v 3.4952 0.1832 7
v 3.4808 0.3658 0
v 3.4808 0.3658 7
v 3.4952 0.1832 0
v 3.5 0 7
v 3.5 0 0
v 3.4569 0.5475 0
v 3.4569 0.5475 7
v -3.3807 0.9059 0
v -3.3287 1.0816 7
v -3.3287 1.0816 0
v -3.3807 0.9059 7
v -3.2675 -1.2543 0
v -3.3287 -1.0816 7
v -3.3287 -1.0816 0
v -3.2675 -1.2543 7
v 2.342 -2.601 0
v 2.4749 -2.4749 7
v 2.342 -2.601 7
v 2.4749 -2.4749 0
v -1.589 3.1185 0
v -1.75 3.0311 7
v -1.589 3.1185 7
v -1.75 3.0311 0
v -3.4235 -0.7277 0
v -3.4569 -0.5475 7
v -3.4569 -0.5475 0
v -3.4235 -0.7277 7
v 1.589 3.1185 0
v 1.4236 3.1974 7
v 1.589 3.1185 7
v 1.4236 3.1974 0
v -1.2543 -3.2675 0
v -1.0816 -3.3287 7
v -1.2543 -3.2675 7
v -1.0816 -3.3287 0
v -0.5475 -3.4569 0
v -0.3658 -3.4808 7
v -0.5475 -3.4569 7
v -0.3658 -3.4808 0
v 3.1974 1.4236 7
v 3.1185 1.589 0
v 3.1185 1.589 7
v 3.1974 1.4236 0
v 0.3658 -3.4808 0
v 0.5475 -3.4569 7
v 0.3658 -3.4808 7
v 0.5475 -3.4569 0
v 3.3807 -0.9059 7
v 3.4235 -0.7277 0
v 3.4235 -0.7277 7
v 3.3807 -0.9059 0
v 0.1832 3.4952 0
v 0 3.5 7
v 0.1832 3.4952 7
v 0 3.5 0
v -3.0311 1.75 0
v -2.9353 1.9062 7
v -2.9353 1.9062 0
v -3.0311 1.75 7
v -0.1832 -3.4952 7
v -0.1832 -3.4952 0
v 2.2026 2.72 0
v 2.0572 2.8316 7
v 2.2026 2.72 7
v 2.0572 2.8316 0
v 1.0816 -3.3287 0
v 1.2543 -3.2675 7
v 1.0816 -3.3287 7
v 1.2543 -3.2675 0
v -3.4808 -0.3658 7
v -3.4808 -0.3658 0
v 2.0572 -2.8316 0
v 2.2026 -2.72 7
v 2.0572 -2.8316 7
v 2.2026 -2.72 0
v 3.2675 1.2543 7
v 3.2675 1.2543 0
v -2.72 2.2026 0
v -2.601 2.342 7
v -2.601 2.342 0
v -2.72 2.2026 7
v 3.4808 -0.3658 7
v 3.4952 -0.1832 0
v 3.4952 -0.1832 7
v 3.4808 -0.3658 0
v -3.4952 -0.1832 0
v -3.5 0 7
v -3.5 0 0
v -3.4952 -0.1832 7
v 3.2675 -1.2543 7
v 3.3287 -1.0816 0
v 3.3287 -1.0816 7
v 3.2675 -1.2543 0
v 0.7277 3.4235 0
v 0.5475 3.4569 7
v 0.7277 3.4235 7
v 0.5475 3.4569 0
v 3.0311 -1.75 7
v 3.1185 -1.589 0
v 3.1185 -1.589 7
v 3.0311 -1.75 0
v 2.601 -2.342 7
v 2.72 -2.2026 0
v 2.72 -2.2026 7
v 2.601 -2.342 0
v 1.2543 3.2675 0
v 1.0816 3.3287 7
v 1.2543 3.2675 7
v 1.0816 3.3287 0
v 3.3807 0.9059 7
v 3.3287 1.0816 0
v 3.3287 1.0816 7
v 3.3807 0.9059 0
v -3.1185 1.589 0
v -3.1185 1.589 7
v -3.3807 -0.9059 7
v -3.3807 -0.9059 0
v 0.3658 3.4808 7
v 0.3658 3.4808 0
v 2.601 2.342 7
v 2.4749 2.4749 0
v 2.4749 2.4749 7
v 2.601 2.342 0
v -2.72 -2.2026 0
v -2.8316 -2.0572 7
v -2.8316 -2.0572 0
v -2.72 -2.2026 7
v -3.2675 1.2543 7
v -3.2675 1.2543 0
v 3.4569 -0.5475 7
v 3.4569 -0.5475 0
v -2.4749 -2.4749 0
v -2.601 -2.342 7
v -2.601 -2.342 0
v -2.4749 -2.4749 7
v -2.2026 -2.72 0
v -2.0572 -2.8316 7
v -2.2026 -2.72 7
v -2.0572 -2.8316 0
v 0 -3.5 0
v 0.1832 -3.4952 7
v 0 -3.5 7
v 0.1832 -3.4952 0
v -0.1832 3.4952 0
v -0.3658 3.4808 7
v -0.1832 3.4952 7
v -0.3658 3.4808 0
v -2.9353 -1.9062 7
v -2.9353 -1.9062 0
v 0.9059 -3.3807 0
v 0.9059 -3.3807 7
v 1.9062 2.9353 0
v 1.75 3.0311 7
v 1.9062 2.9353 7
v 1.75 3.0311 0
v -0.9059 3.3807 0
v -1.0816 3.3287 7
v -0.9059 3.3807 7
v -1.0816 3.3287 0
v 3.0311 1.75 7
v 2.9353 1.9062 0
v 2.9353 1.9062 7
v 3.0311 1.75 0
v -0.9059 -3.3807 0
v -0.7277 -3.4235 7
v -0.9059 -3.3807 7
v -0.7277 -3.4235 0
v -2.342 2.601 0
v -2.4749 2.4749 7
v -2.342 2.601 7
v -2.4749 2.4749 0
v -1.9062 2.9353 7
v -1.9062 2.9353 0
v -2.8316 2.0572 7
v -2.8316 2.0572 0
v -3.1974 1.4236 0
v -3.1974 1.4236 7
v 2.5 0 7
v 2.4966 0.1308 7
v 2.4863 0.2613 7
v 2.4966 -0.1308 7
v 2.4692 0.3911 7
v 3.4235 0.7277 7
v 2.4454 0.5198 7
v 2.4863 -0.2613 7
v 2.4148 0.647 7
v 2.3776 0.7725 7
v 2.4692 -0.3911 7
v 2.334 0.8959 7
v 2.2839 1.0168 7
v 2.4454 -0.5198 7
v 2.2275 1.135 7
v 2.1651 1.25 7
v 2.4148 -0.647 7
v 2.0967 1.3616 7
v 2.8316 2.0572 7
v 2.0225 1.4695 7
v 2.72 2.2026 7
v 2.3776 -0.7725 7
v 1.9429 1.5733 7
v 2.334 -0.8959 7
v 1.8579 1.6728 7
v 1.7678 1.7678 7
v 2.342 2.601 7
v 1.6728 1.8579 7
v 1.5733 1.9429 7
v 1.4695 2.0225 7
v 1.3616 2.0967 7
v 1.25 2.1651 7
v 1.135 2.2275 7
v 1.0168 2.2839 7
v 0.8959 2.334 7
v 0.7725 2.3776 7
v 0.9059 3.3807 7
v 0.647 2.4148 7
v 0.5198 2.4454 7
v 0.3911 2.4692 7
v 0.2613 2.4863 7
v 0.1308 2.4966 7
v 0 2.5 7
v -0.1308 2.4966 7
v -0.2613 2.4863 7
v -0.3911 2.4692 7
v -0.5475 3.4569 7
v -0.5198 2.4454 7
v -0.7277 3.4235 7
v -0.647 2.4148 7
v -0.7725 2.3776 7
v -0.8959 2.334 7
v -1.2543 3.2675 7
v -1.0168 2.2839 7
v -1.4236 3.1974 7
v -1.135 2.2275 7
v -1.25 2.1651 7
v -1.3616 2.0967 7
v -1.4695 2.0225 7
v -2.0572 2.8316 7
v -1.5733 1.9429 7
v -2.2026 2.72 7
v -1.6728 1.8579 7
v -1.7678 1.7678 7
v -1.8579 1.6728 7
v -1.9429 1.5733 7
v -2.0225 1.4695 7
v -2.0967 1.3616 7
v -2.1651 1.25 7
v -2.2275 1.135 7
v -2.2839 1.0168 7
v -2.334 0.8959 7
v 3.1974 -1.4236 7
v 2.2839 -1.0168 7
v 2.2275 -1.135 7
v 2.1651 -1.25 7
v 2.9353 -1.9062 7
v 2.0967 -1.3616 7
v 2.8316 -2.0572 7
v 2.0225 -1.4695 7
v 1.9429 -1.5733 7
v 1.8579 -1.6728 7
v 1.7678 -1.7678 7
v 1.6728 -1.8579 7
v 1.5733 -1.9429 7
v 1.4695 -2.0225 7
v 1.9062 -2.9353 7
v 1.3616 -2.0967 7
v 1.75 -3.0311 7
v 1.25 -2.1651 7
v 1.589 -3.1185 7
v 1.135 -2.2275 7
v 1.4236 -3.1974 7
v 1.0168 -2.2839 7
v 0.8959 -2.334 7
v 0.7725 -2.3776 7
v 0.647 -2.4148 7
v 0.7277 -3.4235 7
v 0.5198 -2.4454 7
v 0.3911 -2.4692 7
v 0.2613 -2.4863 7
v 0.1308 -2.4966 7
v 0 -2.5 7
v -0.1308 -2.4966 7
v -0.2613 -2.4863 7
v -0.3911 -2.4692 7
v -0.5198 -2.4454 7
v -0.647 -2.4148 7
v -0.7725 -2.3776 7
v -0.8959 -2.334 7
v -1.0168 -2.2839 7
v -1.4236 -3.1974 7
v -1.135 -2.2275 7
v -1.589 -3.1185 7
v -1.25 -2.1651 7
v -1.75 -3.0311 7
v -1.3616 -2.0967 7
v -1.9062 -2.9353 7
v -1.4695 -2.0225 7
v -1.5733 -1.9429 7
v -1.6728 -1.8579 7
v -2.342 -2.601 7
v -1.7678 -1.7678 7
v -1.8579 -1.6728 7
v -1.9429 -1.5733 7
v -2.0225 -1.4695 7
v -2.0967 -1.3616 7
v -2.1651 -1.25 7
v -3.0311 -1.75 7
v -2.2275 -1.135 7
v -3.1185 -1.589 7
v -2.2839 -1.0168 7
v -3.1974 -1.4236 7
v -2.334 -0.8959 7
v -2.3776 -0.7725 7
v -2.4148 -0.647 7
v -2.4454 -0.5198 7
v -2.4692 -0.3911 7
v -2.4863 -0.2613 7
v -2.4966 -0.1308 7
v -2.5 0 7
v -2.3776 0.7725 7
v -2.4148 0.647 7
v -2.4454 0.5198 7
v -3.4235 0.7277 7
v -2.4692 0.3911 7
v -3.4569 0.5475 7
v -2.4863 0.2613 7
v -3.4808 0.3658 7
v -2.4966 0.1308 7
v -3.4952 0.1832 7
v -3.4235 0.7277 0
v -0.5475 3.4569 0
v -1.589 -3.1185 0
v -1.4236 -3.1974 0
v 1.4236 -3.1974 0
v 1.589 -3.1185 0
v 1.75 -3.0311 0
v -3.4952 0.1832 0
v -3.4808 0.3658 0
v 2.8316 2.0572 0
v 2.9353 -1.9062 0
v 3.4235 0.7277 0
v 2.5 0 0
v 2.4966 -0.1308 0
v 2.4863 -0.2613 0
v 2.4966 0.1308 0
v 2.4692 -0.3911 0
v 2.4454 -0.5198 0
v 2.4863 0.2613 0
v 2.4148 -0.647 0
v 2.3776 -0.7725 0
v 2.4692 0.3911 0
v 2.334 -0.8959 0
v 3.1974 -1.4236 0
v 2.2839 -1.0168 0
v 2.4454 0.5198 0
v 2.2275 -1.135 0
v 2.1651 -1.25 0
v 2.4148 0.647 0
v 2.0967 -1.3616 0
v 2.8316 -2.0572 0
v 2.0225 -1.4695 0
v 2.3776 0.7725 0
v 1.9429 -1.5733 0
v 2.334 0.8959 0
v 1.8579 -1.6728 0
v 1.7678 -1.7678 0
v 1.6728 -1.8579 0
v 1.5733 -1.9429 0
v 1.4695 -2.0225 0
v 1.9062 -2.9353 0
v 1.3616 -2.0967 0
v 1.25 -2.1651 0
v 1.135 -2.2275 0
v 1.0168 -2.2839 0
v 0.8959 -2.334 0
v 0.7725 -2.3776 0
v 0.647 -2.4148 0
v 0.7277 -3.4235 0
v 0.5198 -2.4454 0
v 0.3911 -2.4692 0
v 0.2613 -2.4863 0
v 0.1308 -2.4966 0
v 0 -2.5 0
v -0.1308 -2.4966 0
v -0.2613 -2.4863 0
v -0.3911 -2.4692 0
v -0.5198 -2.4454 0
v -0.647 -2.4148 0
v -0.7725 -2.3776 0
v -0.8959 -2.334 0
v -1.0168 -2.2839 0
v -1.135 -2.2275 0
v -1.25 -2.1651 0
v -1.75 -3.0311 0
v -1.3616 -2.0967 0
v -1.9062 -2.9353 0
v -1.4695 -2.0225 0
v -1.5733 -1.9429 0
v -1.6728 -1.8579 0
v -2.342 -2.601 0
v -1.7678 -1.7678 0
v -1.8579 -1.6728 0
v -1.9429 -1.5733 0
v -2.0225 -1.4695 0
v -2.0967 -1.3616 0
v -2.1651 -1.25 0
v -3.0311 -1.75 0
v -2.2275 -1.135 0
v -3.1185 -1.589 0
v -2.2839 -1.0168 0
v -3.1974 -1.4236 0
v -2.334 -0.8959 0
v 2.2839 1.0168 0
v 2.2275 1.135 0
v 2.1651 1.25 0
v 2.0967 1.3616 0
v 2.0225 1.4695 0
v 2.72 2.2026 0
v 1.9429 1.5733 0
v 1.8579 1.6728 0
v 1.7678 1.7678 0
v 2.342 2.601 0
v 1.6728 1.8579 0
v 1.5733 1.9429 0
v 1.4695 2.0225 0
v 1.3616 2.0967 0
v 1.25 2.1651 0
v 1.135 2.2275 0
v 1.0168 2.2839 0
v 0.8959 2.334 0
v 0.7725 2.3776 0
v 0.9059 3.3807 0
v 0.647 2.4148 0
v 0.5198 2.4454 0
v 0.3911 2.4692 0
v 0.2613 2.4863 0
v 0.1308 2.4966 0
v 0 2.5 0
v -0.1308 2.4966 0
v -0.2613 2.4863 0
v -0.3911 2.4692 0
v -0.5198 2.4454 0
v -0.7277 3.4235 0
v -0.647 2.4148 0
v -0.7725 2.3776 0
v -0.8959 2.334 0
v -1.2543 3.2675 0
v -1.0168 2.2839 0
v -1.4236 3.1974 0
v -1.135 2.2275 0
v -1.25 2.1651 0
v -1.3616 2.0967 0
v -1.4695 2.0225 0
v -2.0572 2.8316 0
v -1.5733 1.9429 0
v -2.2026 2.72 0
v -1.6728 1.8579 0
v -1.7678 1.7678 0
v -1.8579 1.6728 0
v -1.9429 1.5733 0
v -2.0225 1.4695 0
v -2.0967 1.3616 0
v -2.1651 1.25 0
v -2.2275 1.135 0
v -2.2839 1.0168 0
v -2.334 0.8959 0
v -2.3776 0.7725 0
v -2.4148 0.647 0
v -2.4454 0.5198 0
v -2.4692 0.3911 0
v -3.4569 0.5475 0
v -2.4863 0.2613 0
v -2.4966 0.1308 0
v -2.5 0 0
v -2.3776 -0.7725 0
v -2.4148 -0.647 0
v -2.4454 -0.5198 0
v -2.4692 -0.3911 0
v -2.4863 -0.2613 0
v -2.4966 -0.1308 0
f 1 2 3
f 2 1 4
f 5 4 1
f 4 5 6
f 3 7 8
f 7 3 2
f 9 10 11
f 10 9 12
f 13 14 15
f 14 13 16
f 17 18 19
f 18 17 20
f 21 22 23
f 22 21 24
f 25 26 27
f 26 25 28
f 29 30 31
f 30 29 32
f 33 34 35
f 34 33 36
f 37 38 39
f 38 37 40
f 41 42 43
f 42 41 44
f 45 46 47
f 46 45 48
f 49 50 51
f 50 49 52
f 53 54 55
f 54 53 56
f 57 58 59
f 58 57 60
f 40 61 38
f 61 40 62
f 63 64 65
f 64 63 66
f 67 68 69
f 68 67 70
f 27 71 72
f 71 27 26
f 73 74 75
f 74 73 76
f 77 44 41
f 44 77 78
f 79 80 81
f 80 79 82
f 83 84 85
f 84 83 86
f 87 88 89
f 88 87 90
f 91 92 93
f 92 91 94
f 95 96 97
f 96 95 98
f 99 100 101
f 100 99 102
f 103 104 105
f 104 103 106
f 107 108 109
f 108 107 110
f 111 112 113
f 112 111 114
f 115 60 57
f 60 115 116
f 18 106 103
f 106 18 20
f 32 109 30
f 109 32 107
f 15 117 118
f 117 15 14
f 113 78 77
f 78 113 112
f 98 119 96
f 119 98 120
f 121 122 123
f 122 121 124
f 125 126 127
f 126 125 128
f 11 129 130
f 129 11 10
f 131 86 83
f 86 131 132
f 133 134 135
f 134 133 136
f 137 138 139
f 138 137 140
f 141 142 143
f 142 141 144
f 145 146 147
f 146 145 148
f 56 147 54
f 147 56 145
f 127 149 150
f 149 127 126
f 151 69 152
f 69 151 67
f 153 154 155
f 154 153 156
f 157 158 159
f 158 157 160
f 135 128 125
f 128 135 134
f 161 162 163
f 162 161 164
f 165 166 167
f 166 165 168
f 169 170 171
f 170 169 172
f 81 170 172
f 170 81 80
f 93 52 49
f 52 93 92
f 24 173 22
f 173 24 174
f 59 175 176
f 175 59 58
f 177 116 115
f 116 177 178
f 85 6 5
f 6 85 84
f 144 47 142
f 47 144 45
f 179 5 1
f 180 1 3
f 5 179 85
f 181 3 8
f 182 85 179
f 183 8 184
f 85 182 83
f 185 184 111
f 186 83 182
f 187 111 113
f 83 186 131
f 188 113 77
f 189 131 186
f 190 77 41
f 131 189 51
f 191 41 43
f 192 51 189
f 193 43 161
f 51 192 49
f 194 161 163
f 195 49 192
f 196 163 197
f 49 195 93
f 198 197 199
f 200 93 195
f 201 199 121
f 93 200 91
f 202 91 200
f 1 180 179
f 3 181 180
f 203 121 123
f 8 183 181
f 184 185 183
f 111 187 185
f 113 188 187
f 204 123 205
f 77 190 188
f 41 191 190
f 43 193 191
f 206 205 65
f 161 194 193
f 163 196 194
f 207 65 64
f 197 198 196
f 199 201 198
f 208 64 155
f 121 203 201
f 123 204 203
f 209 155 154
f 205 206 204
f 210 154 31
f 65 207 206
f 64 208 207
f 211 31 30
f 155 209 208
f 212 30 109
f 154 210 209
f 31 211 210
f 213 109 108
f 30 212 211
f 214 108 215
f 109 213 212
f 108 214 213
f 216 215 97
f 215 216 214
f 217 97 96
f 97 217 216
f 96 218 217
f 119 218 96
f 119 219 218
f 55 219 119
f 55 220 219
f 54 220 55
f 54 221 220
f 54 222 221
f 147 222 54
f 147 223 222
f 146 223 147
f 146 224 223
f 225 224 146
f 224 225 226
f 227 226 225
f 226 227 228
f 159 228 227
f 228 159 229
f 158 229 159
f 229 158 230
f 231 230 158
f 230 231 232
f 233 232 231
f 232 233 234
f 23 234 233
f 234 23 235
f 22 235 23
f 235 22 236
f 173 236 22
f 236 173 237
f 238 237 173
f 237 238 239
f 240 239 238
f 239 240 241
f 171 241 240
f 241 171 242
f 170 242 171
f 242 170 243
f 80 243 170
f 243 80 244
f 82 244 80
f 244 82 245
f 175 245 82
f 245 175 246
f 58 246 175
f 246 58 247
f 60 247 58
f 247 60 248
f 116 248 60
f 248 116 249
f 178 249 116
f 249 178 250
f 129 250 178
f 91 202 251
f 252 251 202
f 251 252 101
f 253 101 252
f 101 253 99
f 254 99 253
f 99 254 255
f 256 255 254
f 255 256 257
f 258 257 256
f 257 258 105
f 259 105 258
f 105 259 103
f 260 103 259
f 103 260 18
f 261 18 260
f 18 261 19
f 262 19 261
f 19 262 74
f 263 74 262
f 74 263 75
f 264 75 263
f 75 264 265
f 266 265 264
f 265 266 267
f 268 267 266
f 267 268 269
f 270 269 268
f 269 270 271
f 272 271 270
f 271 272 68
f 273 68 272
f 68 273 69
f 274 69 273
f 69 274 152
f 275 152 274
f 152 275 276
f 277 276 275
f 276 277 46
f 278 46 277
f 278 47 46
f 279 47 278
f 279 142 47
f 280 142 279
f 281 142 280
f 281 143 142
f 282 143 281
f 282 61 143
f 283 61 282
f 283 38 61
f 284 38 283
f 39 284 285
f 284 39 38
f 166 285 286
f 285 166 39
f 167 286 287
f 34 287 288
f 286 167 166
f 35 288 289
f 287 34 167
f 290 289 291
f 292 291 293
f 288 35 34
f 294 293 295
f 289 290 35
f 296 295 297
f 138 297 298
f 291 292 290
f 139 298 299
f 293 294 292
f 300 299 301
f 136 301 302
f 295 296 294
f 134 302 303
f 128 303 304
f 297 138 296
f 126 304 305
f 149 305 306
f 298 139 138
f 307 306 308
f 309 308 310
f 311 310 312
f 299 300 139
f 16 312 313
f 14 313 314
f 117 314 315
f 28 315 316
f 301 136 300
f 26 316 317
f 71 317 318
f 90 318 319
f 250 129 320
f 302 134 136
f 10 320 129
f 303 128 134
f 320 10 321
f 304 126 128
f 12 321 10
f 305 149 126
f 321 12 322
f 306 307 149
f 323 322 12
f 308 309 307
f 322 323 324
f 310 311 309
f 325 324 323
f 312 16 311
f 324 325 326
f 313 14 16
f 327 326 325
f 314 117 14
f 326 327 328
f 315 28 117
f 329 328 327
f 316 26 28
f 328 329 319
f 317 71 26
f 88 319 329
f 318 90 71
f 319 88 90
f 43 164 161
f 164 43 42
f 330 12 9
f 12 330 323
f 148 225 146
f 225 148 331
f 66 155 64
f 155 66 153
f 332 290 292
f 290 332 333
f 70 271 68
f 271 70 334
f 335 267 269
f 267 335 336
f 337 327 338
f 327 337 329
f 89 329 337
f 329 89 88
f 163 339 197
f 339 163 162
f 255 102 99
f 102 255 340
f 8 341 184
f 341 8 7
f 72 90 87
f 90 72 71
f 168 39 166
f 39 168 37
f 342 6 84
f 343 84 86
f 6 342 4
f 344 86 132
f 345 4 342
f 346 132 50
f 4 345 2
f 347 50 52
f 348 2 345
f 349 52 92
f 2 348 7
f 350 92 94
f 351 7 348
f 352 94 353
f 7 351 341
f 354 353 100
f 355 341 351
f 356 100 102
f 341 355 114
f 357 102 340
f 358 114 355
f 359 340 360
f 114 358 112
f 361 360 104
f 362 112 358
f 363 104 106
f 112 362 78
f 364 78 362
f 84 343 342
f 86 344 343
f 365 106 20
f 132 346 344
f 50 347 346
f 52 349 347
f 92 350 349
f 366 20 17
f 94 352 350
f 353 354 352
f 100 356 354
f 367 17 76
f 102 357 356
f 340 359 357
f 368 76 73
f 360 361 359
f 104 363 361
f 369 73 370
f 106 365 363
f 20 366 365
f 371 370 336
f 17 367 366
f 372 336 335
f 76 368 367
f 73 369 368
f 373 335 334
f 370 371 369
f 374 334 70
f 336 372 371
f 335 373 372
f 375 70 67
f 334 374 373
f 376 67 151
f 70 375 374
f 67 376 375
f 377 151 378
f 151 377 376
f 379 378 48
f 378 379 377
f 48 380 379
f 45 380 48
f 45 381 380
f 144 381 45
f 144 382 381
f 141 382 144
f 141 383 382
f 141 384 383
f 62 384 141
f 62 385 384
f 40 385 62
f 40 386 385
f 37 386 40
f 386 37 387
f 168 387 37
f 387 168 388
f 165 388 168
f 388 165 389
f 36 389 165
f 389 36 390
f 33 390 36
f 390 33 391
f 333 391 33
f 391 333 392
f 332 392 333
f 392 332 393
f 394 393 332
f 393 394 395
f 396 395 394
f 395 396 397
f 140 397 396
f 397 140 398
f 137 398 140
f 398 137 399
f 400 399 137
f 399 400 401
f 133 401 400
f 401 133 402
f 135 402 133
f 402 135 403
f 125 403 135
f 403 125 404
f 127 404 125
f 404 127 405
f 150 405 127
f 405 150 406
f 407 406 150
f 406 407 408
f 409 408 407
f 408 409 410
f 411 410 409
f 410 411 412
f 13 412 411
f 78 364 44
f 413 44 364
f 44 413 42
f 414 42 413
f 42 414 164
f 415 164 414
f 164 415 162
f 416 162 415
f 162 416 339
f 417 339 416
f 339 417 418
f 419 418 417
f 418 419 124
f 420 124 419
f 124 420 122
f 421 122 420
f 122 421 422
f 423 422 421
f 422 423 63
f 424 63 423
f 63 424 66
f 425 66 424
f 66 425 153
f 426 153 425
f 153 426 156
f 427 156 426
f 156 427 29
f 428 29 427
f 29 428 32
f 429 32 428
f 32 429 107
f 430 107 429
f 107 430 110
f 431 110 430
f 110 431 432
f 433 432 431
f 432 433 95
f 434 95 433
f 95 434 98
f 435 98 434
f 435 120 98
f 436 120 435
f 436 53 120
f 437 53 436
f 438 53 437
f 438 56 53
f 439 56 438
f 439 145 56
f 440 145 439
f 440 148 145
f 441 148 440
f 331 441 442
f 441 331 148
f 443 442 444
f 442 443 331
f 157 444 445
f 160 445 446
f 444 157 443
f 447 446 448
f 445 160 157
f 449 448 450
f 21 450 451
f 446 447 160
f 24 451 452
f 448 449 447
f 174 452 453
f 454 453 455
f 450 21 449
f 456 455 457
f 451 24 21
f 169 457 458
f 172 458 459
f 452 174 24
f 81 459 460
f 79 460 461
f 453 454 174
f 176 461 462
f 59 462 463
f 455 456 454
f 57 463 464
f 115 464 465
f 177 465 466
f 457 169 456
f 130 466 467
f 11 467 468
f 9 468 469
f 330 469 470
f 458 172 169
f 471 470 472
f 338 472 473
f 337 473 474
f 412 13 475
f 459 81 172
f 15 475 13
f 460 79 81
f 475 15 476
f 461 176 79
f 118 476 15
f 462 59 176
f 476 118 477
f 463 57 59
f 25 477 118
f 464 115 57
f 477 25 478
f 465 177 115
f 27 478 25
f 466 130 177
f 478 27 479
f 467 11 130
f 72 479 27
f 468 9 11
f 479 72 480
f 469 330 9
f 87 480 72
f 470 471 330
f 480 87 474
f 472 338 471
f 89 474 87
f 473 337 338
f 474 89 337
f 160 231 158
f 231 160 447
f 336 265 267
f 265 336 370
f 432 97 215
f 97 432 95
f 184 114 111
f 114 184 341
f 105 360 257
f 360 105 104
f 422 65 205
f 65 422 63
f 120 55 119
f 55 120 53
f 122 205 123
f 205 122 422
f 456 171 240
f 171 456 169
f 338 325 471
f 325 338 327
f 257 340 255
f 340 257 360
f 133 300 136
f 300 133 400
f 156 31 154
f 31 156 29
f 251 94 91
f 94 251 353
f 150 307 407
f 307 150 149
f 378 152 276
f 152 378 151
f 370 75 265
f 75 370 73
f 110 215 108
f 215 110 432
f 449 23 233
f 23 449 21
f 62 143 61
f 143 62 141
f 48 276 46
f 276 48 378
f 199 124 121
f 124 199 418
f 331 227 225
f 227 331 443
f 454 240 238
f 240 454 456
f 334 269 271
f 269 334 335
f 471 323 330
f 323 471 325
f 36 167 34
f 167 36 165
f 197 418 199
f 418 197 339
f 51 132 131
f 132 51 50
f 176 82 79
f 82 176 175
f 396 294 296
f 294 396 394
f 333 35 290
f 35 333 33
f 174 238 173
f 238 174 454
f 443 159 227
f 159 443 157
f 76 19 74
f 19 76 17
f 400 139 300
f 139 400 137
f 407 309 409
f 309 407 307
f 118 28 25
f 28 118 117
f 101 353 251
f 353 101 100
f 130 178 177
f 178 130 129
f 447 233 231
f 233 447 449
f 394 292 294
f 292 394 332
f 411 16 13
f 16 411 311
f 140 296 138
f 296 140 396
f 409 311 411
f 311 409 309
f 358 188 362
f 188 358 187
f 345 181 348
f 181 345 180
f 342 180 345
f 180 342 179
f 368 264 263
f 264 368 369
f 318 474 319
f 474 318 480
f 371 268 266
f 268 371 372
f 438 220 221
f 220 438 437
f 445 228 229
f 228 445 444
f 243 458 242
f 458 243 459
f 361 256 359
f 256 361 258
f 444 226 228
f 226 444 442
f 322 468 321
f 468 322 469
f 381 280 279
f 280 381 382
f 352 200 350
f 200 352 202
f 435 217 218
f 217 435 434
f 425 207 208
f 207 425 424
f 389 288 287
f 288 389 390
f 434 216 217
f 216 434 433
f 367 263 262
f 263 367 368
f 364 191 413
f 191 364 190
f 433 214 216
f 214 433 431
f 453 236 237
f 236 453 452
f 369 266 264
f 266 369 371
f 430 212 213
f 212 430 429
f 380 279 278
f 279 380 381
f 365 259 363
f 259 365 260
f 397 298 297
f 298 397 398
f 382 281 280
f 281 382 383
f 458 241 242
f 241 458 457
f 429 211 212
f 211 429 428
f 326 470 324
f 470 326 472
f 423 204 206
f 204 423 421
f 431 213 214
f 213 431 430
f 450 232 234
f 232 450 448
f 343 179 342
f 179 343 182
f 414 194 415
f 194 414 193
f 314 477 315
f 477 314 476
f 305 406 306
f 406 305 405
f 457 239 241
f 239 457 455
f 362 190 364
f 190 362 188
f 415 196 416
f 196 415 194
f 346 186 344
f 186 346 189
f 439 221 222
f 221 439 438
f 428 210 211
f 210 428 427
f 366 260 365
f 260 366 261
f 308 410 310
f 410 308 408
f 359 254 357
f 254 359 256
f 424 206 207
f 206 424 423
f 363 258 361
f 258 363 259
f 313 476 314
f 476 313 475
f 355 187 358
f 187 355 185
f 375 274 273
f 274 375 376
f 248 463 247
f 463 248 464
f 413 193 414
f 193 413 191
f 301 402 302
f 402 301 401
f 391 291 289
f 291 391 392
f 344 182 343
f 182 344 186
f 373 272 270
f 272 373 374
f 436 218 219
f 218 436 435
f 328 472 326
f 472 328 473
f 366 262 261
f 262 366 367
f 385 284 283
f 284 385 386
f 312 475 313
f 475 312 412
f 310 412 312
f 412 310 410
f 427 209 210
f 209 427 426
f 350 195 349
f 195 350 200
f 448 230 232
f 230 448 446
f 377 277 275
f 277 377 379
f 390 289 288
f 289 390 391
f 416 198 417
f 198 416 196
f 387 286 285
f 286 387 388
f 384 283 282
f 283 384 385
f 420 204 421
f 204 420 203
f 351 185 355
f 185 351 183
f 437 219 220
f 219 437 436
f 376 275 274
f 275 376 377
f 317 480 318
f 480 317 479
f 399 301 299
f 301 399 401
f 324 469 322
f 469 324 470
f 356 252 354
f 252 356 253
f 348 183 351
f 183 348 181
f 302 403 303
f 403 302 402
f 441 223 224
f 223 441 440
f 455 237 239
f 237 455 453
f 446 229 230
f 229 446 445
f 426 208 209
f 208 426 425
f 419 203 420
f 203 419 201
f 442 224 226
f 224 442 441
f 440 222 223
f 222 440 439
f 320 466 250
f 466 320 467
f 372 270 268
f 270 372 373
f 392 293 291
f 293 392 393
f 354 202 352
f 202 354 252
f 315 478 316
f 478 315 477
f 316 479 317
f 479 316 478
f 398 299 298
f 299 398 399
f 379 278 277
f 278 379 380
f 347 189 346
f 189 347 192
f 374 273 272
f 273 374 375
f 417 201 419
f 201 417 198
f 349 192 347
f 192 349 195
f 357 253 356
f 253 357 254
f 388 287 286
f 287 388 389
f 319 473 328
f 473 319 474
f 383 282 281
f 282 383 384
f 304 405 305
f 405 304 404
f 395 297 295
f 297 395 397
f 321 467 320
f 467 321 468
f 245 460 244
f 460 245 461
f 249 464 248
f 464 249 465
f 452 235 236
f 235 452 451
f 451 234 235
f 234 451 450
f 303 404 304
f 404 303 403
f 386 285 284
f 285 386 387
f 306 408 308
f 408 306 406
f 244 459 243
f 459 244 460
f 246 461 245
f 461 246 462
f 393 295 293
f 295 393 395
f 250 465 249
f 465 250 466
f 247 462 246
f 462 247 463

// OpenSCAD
// Real Lonely T-Rex Game: Bearing Shaft Spacer
// Copyright (C) 2017, Uri Shaked and Ariella Eliassaf

$fn = 120;

difference() {
    cylinder(h=7, r=3.5);
    cylinder(h=7, r=2.5);
}    
